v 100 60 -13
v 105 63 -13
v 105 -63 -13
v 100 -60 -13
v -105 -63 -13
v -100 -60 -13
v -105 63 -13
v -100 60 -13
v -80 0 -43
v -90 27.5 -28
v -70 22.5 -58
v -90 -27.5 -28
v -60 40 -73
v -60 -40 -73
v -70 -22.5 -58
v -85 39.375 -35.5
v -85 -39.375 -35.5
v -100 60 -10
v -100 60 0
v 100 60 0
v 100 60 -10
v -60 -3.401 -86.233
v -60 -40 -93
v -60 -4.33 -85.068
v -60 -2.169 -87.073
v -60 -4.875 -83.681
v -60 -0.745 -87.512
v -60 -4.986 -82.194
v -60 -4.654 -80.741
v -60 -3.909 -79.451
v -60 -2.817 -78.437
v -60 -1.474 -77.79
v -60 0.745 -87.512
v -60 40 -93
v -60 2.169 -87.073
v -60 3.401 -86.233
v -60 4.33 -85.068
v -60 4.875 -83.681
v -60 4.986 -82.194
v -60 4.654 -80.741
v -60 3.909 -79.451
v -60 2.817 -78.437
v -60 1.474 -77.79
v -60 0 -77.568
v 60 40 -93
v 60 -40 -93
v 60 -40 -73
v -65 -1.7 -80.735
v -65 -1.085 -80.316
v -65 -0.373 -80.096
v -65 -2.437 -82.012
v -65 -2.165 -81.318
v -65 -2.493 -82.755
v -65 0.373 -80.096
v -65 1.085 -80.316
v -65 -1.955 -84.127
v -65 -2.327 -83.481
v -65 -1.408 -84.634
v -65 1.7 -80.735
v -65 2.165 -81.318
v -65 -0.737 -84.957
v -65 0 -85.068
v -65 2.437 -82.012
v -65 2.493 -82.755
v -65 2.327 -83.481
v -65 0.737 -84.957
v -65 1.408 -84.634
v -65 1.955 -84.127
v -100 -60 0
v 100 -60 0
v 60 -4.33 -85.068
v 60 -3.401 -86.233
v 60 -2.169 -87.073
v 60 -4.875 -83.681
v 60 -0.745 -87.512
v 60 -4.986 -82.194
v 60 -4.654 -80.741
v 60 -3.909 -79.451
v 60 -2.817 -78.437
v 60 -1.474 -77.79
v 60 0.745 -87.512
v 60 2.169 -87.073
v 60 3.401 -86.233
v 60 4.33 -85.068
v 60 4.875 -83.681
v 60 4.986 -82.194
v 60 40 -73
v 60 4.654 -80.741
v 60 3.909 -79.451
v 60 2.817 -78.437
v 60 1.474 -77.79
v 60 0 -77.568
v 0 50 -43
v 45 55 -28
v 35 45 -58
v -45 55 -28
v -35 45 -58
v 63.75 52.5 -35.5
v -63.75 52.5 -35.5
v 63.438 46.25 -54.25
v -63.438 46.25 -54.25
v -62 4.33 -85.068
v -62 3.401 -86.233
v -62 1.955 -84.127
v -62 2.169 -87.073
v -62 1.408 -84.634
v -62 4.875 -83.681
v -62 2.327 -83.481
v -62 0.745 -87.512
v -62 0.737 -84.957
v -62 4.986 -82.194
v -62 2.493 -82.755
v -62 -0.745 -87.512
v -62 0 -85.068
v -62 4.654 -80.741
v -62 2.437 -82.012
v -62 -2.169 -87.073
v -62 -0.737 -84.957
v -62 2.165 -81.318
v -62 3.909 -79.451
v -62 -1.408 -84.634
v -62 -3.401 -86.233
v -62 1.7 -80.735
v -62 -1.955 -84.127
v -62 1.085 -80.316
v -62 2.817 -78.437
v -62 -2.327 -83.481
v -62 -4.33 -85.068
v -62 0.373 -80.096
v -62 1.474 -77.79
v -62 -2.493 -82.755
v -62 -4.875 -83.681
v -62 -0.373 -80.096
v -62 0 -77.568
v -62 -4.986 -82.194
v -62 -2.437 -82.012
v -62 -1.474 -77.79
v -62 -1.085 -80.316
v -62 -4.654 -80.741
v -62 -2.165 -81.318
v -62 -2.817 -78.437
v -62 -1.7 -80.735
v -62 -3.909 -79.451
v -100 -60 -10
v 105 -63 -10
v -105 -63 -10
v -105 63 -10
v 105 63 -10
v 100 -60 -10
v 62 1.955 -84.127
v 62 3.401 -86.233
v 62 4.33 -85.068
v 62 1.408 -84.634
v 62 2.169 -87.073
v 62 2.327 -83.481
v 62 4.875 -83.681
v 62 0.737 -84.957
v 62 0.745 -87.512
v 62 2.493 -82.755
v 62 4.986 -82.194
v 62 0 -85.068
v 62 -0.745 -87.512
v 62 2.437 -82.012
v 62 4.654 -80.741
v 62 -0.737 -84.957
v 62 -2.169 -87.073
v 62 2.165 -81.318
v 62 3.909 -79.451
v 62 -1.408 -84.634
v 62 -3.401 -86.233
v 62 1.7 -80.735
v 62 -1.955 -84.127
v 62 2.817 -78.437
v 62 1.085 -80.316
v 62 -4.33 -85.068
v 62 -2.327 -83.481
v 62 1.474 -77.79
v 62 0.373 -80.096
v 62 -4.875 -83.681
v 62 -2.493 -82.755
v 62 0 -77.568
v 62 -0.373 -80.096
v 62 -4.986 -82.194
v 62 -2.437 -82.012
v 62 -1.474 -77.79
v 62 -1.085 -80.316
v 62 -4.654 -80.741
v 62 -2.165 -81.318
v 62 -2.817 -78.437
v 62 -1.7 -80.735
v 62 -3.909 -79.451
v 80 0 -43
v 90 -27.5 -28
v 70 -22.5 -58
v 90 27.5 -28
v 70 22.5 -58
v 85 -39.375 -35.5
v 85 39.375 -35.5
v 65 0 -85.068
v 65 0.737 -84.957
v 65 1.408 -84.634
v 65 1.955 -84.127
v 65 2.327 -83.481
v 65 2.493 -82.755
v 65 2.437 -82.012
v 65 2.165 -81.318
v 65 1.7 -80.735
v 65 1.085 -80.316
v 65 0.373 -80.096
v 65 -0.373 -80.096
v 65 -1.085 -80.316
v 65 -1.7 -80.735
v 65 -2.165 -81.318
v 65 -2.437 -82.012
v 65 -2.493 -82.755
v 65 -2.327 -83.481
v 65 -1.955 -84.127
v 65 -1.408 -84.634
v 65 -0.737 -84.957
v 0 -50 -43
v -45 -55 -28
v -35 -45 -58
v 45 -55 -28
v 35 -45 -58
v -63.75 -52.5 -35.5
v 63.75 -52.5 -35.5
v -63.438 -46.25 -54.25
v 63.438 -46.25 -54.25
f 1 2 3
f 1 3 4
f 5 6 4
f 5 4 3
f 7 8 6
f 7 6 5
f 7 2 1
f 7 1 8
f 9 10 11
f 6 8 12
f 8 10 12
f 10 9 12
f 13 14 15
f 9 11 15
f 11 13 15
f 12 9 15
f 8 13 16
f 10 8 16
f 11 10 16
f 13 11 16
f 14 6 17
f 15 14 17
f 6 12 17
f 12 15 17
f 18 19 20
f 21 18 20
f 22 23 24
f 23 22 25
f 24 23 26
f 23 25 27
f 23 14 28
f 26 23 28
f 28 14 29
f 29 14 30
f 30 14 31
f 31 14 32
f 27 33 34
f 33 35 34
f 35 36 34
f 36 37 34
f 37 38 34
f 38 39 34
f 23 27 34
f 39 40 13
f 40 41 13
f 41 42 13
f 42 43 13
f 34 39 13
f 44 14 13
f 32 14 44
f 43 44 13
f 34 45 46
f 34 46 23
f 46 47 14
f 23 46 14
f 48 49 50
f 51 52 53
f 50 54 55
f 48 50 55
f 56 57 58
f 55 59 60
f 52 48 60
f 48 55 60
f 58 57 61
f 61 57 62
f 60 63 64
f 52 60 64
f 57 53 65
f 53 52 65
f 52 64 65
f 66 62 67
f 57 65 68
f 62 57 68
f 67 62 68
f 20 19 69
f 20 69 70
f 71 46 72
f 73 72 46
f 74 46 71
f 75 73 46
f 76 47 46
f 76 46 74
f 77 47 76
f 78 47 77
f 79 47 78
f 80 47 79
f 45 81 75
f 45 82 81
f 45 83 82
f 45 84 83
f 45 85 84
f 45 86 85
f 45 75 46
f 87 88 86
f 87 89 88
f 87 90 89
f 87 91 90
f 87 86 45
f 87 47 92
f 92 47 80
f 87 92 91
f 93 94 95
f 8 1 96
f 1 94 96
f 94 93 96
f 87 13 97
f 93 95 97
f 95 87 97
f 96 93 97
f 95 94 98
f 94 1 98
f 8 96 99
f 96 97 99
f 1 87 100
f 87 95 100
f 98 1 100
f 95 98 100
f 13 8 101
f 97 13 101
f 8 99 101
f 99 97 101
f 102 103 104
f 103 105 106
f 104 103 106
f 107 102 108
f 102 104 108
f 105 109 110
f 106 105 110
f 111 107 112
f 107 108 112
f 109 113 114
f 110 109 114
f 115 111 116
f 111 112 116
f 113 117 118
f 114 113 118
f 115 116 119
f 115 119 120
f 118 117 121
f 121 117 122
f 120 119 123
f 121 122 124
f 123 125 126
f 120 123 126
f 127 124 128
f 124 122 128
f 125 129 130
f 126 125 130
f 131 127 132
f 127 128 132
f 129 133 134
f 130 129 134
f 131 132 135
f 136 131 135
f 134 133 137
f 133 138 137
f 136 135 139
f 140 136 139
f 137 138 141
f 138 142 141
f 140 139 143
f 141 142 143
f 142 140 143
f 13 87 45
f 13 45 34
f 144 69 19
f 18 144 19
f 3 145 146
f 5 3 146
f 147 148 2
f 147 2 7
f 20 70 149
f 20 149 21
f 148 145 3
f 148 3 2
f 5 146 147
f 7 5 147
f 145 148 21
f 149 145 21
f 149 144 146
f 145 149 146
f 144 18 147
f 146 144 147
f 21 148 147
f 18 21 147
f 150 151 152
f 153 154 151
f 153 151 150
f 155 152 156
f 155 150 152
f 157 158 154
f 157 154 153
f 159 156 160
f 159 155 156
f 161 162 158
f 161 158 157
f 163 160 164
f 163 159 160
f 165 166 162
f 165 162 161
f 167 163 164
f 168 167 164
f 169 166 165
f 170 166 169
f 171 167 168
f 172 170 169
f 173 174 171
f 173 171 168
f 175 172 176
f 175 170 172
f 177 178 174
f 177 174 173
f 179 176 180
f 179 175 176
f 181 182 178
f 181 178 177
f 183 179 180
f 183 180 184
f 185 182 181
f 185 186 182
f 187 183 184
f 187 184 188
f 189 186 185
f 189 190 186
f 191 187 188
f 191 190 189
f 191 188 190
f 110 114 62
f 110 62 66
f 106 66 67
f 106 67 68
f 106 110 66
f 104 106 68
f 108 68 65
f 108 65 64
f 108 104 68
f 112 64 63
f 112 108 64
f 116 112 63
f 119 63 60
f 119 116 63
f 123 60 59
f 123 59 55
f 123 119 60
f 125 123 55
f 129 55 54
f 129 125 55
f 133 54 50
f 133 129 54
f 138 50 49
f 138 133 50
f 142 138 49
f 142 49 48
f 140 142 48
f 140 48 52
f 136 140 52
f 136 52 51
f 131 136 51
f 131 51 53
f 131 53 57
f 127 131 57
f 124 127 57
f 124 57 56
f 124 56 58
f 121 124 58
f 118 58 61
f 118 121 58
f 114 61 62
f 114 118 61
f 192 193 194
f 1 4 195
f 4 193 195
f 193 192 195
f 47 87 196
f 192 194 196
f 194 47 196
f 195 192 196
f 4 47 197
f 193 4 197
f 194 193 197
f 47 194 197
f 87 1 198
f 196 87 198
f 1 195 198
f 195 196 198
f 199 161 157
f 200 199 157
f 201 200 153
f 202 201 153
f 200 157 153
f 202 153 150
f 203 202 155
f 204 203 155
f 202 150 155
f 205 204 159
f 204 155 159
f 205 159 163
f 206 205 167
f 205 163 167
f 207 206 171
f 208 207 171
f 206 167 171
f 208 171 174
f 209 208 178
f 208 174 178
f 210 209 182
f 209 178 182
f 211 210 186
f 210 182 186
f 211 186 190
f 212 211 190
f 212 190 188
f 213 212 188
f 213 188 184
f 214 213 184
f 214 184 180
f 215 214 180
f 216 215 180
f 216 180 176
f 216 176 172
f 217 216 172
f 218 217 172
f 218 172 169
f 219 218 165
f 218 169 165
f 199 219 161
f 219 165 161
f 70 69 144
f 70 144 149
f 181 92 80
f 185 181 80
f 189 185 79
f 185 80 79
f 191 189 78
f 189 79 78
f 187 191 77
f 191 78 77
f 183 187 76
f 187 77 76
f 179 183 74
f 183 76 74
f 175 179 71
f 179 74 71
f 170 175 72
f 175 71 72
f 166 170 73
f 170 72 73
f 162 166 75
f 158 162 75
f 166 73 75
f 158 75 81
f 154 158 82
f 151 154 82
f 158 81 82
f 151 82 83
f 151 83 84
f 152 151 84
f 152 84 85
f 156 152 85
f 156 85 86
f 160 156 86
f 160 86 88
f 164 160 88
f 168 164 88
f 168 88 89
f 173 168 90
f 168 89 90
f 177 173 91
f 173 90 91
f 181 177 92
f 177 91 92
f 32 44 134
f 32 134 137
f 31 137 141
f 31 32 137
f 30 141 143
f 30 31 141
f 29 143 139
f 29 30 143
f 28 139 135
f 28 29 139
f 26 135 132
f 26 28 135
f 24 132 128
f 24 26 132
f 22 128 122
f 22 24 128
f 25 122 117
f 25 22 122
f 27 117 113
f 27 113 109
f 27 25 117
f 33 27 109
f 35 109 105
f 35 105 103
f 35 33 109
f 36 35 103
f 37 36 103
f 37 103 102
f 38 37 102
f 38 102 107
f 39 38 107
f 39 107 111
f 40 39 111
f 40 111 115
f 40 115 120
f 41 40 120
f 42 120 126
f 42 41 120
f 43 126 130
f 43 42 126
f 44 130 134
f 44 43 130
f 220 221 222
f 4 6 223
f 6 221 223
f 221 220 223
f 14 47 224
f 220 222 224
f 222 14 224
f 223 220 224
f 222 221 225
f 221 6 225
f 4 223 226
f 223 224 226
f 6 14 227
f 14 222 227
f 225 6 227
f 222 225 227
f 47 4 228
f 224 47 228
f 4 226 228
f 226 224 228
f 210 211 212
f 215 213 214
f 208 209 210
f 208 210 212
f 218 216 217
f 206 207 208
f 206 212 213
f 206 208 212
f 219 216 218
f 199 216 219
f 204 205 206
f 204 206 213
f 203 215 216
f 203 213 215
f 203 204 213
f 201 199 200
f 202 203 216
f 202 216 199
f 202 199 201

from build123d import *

# Parameters (mm, degrees)
SKETCH_2_W      = 200
SKETCH_2_H      = 120
EXTRUDE_1_DEPTH = 10
SKETCH_3_W      = 210
SKETCH_3_H      = 126
EXTRUDE_2_DEPTH = 3
SKETCH_8_W      = 120
SKETCH_8_H      = 80
EXTRUDE_4_DEPTH = 20
SKETCH_9_R      = 5
EXTRUDE_5_DEPTH = 2
SKETCH_10_R     = 2.5
EXTRUDE_6_DEPTH = 3


with BuildPart() as part:
    # 草图2 → 凸台-拉伸1 (new body)
    with BuildSketch(Plane.XY):
        Rectangle(SKETCH_2_W, SKETCH_2_H)
    extrude(amount=-EXTRUDE_1_DEPTH)

    # 草图3 → 凸台-拉伸2 (add)
    with BuildSketch(Plane(origin=(0, 0, -10), x_dir=(-1, 0, 0), z_dir=(0, 0, -1))):
        Rectangle(SKETCH_3_W, SKETCH_3_H)
    extrude(amount=EXTRUDE_2_DEPTH)

    # 草图5 → 放样2 section 0
    with BuildSketch(Plane(origin=(0, 0, -13), x_dir=(-1, 0, 0), z_dir=(0, 0, -1))):
        with BuildLine():
            Line((-100, 60), (100, 60))
            Line((100, 60), (100, -60))
            Line((100, -60), (-100, -60))
            Line((-100, -60), (-100, 60))
        make_face()
    # 草图4 → 放样2 section 1
    with BuildSketch(Plane(origin=(0, 0, -73), x_dir=(-1, 0, 0), z_dir=(0, 0, -1))):
        with BuildLine():
            Line((-60, 40), (60, 40))
            Line((60, 40), (60, -40))
            Line((60, -40), (-60, -40))
            Line((-60, -40), (-60, 40))
        make_face()
    loft()

    # 草图8 → 凸台-拉伸4 (add)
    with BuildSketch(Plane(origin=(0, 0, -73), x_dir=(-1, 0, 0), z_dir=(0, 0, -1))):
        Rectangle(SKETCH_8_W, SKETCH_8_H)
    extrude(amount=EXTRUDE_4_DEPTH)

    # 草图9 → 凸台-拉伸5 (add)
    with BuildSketch(Plane(origin=(60, 0, 0), x_dir=(0, 0, -1), z_dir=(1, 0, 0))):
        with Locations(Location((82.568018159, 0, 0), (0, 0, 180))):
            Circle(SKETCH_9_R)
    extrude_5 = extrude(amount=EXTRUDE_5_DEPTH)

    # 草图10 → 凸台-拉伸6 (add)
    with BuildSketch(Plane(origin=(62, 0, 0), x_dir=(0, 0, -1), z_dir=(1, 0, 0))):
        with Locations((82.568018159, 0)):
            Circle(SKETCH_10_R)
    extrude_6 = extrude(amount=EXTRUDE_6_DEPTH)

    # 镜向1: 凸台-拉伸5, 凸台-拉伸6 across plane
    add(extrude_5.mirror(Plane(origin=(0, 0, 0), x_dir=(0, 0, 1), z_dir=(1, 0, 0))))
    add(extrude_6.mirror(Plane(origin=(0, 0, 0), x_dir=(0, 0, 1), z_dir=(1, 0, 0))))


solid = part.part
